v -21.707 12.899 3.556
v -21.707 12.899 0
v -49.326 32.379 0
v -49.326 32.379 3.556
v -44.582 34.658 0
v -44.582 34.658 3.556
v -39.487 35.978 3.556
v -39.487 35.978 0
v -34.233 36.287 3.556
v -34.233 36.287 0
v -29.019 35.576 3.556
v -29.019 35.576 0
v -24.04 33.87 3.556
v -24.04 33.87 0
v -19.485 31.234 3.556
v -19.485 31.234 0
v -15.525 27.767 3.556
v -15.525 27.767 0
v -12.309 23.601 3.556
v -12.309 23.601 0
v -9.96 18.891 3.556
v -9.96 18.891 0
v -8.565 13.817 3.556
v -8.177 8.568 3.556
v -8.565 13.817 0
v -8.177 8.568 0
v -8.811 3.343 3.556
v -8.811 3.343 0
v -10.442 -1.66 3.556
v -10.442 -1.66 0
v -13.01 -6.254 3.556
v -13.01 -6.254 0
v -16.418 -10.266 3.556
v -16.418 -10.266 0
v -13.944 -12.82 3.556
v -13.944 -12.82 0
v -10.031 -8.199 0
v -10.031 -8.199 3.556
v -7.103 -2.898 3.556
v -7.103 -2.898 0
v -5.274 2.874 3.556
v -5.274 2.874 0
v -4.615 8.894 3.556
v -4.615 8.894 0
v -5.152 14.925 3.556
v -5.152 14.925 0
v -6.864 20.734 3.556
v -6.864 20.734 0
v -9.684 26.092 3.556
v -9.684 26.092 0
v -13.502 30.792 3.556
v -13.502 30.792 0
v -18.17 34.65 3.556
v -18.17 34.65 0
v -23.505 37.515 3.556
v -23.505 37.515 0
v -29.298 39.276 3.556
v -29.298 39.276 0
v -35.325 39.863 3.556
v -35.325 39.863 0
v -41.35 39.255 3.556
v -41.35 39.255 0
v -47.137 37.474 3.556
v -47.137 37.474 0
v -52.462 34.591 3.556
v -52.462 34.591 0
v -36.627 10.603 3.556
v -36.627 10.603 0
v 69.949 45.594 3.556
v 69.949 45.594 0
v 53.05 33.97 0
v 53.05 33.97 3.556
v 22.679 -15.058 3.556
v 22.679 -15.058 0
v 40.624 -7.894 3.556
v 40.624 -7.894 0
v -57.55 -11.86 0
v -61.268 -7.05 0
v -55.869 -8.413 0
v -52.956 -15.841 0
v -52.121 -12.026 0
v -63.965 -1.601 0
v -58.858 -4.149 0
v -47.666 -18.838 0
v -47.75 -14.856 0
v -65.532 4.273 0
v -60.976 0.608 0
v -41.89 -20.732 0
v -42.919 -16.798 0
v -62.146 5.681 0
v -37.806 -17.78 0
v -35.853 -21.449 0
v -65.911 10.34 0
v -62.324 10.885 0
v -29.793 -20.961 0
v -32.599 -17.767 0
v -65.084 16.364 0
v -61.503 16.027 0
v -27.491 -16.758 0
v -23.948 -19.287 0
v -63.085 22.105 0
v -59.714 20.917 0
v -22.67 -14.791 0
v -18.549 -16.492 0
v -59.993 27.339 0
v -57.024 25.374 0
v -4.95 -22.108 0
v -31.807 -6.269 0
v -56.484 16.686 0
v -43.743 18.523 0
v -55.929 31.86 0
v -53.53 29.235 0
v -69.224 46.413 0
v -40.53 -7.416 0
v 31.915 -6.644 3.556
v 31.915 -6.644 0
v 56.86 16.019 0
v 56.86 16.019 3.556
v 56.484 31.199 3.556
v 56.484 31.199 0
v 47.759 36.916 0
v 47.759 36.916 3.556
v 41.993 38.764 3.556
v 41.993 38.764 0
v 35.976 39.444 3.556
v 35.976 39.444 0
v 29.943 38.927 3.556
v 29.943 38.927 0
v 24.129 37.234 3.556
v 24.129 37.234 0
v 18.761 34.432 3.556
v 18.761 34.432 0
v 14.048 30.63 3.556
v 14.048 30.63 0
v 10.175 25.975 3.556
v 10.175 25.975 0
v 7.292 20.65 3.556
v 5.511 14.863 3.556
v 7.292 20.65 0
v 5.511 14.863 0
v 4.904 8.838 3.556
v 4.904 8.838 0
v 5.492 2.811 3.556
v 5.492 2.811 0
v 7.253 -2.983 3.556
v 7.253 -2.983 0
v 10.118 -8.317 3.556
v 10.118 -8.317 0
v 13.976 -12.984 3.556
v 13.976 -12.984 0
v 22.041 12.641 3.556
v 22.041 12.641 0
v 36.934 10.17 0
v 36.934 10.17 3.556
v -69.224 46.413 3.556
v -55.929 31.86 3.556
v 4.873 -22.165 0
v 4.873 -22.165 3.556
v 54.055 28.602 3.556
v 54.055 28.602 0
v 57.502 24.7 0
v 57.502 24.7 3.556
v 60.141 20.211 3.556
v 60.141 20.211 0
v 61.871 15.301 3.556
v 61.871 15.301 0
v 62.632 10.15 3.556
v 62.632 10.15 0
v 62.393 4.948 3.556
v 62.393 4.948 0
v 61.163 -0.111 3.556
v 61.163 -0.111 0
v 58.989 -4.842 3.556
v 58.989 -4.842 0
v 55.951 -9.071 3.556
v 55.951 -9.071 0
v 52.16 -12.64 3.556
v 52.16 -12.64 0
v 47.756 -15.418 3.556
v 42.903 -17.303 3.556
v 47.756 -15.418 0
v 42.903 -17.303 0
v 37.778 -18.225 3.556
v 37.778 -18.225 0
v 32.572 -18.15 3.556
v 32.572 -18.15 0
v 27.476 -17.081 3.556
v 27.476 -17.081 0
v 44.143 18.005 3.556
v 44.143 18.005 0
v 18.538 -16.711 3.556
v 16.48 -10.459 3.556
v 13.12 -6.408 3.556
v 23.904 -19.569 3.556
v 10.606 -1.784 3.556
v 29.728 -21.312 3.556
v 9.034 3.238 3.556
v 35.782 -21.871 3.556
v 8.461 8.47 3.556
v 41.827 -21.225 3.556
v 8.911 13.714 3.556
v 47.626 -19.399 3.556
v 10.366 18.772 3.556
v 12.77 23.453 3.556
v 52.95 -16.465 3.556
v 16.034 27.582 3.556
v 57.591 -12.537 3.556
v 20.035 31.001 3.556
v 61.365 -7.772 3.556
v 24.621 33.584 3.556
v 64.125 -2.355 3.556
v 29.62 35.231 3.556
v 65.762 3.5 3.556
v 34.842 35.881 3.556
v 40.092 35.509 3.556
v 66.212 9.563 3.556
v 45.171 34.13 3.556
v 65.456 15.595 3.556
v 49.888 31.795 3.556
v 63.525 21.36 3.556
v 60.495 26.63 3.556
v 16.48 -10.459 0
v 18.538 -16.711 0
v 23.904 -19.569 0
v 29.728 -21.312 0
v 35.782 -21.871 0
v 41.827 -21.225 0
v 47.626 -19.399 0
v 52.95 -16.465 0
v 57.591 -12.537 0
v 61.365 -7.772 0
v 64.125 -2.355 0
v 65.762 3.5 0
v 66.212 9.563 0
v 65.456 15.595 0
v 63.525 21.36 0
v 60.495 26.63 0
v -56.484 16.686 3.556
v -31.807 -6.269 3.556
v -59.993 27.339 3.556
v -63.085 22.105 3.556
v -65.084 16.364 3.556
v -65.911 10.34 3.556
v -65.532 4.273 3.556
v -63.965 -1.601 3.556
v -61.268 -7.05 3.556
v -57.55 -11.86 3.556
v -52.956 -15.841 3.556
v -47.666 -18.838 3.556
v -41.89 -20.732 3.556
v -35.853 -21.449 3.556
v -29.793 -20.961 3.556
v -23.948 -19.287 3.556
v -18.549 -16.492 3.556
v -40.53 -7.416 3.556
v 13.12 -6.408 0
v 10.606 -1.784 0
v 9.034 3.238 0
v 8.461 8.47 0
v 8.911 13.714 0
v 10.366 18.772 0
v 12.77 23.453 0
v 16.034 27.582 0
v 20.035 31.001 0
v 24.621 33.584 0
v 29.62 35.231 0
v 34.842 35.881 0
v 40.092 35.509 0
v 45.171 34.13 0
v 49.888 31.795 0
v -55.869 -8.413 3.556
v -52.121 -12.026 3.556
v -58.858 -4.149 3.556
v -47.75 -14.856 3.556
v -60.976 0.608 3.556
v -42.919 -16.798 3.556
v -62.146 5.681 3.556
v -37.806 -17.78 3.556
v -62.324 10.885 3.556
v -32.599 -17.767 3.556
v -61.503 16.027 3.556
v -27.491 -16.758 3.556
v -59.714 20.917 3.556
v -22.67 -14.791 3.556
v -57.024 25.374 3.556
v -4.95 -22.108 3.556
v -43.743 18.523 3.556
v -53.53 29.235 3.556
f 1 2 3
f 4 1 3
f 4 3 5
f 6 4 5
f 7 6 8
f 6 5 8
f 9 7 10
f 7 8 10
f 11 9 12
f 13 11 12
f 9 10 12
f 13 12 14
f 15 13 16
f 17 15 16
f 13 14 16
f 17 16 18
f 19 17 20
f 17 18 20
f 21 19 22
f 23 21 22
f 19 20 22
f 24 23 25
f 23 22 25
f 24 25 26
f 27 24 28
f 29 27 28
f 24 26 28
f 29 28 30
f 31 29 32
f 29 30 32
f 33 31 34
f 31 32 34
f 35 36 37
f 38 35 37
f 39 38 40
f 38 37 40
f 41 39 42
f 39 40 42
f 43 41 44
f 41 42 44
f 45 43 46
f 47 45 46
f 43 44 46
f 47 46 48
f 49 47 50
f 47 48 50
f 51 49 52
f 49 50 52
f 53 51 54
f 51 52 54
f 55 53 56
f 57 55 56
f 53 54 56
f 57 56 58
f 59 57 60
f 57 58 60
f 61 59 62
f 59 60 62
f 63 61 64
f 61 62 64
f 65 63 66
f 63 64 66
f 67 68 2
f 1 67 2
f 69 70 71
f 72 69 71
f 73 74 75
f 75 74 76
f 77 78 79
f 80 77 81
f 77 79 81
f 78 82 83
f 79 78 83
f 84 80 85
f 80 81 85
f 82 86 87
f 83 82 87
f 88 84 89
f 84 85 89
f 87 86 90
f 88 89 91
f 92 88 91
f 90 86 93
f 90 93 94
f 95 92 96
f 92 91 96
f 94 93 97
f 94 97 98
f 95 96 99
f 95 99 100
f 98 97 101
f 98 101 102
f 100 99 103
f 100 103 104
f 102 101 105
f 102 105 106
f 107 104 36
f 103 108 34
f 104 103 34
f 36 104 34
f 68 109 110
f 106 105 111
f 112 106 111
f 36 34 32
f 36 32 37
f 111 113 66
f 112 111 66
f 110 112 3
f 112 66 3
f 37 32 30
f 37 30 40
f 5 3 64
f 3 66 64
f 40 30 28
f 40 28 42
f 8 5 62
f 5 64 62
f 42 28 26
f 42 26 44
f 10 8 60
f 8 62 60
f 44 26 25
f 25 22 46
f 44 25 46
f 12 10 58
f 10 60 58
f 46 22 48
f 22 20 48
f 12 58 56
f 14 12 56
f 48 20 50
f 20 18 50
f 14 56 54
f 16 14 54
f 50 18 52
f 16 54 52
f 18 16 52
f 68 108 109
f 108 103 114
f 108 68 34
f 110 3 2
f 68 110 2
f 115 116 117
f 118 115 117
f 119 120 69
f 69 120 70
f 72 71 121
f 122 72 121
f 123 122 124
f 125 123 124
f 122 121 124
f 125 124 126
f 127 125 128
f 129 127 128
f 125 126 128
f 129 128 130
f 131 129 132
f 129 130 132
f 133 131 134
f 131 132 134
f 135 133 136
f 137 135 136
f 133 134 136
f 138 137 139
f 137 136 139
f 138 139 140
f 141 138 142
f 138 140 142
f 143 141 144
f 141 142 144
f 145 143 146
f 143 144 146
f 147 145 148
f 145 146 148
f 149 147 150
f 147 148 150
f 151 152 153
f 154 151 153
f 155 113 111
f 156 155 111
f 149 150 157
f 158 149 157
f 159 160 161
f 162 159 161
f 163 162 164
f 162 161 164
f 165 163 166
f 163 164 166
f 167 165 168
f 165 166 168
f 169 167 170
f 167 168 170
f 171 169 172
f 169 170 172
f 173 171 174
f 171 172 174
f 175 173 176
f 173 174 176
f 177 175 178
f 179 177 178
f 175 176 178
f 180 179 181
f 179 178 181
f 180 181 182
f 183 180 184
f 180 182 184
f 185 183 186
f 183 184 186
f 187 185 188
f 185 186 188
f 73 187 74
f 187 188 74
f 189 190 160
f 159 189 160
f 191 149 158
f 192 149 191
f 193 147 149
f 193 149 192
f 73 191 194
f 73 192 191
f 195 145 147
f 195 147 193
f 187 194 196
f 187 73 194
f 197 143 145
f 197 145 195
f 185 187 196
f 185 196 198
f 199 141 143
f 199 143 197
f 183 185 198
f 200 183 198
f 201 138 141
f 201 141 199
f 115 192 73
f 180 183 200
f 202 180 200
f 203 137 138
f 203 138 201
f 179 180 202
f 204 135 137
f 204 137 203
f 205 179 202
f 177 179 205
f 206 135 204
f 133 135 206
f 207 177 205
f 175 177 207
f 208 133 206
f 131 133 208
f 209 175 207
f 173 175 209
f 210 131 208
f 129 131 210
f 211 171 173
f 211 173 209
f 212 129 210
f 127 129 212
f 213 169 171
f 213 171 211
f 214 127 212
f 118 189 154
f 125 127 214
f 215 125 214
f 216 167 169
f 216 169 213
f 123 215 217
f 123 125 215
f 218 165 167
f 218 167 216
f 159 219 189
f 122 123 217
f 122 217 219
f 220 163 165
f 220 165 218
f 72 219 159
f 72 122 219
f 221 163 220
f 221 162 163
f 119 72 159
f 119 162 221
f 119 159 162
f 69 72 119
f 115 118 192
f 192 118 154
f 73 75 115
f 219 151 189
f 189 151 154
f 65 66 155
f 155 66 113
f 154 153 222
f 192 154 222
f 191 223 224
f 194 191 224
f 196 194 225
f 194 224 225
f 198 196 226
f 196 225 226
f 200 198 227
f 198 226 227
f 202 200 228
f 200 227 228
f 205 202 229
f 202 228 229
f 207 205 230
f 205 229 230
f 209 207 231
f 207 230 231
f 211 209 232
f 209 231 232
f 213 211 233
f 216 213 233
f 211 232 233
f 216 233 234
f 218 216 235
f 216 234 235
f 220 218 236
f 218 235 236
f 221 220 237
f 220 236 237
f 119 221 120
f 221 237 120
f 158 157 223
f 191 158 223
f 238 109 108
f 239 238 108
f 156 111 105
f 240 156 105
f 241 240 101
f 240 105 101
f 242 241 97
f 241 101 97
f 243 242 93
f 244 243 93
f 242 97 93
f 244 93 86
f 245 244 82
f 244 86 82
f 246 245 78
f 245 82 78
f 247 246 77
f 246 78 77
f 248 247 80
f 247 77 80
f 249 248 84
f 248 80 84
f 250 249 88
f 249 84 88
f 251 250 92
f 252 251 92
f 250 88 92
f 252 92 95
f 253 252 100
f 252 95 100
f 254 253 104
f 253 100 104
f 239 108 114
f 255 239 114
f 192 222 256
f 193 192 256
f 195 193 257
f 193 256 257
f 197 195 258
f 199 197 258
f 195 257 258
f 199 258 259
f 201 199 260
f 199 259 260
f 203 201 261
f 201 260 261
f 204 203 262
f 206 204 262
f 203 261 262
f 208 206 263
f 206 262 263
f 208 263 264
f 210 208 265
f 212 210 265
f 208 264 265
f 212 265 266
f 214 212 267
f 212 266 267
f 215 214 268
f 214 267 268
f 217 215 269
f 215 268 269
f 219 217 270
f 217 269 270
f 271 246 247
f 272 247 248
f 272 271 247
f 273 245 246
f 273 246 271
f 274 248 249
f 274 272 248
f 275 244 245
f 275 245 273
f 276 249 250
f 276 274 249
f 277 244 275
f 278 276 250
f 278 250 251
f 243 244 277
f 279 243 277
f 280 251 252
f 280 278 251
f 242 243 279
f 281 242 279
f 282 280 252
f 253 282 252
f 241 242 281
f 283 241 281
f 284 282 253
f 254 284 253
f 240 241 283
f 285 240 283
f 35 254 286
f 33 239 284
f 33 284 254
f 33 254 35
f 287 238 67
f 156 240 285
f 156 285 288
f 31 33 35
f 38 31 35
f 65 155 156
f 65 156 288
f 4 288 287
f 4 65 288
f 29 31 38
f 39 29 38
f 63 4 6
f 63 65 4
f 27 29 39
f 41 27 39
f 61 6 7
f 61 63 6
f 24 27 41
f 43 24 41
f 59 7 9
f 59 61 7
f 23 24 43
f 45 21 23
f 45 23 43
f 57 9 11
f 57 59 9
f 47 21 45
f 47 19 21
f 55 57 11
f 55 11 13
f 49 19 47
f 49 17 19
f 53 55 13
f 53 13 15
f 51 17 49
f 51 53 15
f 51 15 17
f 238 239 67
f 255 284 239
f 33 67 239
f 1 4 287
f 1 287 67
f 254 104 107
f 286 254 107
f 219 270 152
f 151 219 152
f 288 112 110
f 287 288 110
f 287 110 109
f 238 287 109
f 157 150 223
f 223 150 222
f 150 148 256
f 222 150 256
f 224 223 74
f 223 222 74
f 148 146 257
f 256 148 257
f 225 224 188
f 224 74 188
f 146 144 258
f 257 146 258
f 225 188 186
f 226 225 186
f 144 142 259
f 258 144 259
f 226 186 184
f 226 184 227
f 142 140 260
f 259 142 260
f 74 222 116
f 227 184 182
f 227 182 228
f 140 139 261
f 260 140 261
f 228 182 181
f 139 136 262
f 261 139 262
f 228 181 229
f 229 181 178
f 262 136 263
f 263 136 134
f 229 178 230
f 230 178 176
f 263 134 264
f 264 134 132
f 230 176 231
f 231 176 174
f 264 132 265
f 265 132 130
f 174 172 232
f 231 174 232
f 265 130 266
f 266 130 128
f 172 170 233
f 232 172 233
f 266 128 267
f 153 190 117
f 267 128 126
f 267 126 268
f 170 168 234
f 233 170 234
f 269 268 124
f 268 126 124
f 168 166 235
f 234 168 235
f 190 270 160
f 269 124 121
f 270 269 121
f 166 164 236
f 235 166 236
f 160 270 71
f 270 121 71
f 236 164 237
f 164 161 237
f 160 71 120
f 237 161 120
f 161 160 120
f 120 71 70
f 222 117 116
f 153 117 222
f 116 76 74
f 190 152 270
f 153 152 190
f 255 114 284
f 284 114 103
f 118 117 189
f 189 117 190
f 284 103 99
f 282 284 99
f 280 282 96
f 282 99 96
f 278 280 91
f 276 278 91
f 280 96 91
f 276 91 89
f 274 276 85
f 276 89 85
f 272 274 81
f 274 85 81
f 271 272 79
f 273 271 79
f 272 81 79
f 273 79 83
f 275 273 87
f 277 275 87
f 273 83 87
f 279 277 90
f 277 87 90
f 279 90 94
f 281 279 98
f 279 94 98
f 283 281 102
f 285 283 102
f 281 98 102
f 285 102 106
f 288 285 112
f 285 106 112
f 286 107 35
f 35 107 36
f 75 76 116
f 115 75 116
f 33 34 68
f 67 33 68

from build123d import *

# Parameters (mm, degrees)
F1_DEPTH = 3.556


with BuildPart() as f1:
    # F0 (on Top) → F1 (new body)
    with BuildSketch(Plane.XY):
        with BuildLine():
            Line((-52.462292, 34.591052), (-69.223523, 46.412986))
            Line((-69.223523, 46.412986), (-55.92863, 31.860464))
            ThreePointArc((-55.92863, 31.860464), (-59.528808, -9.547279), (-18.549197, -16.492338))
            Line((-18.549197, -16.492338), (-4.949536, -22.107681))
            Line((-4.949536, -22.107681), (-13.943851, -12.820073))
            ThreePointArc((-13.943851, -12.820073), (-11.47685, 28.536624), (-52.462292, 34.591052))
        make_face()
        with BuildLine():
            Line((-31.806882, -6.268735), (-40.52978, -7.416485))
            Line((-40.52978, -7.416485), (-22.670135, -14.790789))
            ThreePointArc((-22.670135, -14.790789), (-57.466384, -6.352633), (-53.530161, 29.235112))
            Line((-53.530161, 29.235112), (-43.74348, 18.522661))
            Line((-43.74348, 18.522661), (-56.483503, 16.686263))
            Line((-56.483503, 16.686263), (-31.806882, -6.268735))
        make_face(mode=Mode.SUBTRACT)
        with BuildLine():
            Line((-36.62743, 10.603188), (-21.706684, 12.898687))
            Line((-21.706684, 12.898687), (-49.32612, 32.379066))
            ThreePointArc((-49.32612, 32.379066), (-13.815524, 25.762344), (-16.417663, -10.265594))
            Line((-16.417663, -10.265594), (-36.62743, 10.603188))
        make_face(mode=Mode.SUBTRACT)
        with BuildLine():
            Line((56.483931, 31.198907), (69.949183, 45.593944))
            Line((69.949183, 45.593944), (53.049971, 33.970104))
            ThreePointArc((53.049971, 33.970104), (11.99611, 28.398484), (13.976182, -12.984385))
            Line((13.976182, -12.984385), (4.873177, -22.165489))
            Line((4.873177, -22.165489), (18.537987, -16.710599))
            ThreePointArc((18.537987, -16.710599), (59.596502, -10.24834), (56.483931, 31.198907))
        make_face()
        with BuildLine():
            Line((56.86017, 16.019226), (44.142643, 18.005445))
            Line((44.142643, 18.005445), (54.054729, 28.601966))
            ThreePointArc((54.054729, 28.601966), (57.571821, -7.029642), (22.678666, -15.057671))
            Line((22.678666, -15.057671), (40.623868, -7.89408))
            Line((40.623868, -7.89408), (31.915084, -6.643743))
            Line((31.915084, -6.643743), (56.86017, 16.019226))
        make_face(mode=Mode.SUBTRACT)
        with BuildLine():
            Line((22.04118, 12.641228), (36.933876, 10.170274))
            Line((36.933876, 10.170274), (16.479888, -10.459198))
            ThreePointArc((16.479888, -10.459198), (14.30197, 25.596871), (49.887983, 31.795184))
            Line((49.887983, 31.795184), (22.04118, 12.641228))
        make_face(mode=Mode.SUBTRACT)
    extrude(amount=F1_DEPTH)


solid = f1.part
